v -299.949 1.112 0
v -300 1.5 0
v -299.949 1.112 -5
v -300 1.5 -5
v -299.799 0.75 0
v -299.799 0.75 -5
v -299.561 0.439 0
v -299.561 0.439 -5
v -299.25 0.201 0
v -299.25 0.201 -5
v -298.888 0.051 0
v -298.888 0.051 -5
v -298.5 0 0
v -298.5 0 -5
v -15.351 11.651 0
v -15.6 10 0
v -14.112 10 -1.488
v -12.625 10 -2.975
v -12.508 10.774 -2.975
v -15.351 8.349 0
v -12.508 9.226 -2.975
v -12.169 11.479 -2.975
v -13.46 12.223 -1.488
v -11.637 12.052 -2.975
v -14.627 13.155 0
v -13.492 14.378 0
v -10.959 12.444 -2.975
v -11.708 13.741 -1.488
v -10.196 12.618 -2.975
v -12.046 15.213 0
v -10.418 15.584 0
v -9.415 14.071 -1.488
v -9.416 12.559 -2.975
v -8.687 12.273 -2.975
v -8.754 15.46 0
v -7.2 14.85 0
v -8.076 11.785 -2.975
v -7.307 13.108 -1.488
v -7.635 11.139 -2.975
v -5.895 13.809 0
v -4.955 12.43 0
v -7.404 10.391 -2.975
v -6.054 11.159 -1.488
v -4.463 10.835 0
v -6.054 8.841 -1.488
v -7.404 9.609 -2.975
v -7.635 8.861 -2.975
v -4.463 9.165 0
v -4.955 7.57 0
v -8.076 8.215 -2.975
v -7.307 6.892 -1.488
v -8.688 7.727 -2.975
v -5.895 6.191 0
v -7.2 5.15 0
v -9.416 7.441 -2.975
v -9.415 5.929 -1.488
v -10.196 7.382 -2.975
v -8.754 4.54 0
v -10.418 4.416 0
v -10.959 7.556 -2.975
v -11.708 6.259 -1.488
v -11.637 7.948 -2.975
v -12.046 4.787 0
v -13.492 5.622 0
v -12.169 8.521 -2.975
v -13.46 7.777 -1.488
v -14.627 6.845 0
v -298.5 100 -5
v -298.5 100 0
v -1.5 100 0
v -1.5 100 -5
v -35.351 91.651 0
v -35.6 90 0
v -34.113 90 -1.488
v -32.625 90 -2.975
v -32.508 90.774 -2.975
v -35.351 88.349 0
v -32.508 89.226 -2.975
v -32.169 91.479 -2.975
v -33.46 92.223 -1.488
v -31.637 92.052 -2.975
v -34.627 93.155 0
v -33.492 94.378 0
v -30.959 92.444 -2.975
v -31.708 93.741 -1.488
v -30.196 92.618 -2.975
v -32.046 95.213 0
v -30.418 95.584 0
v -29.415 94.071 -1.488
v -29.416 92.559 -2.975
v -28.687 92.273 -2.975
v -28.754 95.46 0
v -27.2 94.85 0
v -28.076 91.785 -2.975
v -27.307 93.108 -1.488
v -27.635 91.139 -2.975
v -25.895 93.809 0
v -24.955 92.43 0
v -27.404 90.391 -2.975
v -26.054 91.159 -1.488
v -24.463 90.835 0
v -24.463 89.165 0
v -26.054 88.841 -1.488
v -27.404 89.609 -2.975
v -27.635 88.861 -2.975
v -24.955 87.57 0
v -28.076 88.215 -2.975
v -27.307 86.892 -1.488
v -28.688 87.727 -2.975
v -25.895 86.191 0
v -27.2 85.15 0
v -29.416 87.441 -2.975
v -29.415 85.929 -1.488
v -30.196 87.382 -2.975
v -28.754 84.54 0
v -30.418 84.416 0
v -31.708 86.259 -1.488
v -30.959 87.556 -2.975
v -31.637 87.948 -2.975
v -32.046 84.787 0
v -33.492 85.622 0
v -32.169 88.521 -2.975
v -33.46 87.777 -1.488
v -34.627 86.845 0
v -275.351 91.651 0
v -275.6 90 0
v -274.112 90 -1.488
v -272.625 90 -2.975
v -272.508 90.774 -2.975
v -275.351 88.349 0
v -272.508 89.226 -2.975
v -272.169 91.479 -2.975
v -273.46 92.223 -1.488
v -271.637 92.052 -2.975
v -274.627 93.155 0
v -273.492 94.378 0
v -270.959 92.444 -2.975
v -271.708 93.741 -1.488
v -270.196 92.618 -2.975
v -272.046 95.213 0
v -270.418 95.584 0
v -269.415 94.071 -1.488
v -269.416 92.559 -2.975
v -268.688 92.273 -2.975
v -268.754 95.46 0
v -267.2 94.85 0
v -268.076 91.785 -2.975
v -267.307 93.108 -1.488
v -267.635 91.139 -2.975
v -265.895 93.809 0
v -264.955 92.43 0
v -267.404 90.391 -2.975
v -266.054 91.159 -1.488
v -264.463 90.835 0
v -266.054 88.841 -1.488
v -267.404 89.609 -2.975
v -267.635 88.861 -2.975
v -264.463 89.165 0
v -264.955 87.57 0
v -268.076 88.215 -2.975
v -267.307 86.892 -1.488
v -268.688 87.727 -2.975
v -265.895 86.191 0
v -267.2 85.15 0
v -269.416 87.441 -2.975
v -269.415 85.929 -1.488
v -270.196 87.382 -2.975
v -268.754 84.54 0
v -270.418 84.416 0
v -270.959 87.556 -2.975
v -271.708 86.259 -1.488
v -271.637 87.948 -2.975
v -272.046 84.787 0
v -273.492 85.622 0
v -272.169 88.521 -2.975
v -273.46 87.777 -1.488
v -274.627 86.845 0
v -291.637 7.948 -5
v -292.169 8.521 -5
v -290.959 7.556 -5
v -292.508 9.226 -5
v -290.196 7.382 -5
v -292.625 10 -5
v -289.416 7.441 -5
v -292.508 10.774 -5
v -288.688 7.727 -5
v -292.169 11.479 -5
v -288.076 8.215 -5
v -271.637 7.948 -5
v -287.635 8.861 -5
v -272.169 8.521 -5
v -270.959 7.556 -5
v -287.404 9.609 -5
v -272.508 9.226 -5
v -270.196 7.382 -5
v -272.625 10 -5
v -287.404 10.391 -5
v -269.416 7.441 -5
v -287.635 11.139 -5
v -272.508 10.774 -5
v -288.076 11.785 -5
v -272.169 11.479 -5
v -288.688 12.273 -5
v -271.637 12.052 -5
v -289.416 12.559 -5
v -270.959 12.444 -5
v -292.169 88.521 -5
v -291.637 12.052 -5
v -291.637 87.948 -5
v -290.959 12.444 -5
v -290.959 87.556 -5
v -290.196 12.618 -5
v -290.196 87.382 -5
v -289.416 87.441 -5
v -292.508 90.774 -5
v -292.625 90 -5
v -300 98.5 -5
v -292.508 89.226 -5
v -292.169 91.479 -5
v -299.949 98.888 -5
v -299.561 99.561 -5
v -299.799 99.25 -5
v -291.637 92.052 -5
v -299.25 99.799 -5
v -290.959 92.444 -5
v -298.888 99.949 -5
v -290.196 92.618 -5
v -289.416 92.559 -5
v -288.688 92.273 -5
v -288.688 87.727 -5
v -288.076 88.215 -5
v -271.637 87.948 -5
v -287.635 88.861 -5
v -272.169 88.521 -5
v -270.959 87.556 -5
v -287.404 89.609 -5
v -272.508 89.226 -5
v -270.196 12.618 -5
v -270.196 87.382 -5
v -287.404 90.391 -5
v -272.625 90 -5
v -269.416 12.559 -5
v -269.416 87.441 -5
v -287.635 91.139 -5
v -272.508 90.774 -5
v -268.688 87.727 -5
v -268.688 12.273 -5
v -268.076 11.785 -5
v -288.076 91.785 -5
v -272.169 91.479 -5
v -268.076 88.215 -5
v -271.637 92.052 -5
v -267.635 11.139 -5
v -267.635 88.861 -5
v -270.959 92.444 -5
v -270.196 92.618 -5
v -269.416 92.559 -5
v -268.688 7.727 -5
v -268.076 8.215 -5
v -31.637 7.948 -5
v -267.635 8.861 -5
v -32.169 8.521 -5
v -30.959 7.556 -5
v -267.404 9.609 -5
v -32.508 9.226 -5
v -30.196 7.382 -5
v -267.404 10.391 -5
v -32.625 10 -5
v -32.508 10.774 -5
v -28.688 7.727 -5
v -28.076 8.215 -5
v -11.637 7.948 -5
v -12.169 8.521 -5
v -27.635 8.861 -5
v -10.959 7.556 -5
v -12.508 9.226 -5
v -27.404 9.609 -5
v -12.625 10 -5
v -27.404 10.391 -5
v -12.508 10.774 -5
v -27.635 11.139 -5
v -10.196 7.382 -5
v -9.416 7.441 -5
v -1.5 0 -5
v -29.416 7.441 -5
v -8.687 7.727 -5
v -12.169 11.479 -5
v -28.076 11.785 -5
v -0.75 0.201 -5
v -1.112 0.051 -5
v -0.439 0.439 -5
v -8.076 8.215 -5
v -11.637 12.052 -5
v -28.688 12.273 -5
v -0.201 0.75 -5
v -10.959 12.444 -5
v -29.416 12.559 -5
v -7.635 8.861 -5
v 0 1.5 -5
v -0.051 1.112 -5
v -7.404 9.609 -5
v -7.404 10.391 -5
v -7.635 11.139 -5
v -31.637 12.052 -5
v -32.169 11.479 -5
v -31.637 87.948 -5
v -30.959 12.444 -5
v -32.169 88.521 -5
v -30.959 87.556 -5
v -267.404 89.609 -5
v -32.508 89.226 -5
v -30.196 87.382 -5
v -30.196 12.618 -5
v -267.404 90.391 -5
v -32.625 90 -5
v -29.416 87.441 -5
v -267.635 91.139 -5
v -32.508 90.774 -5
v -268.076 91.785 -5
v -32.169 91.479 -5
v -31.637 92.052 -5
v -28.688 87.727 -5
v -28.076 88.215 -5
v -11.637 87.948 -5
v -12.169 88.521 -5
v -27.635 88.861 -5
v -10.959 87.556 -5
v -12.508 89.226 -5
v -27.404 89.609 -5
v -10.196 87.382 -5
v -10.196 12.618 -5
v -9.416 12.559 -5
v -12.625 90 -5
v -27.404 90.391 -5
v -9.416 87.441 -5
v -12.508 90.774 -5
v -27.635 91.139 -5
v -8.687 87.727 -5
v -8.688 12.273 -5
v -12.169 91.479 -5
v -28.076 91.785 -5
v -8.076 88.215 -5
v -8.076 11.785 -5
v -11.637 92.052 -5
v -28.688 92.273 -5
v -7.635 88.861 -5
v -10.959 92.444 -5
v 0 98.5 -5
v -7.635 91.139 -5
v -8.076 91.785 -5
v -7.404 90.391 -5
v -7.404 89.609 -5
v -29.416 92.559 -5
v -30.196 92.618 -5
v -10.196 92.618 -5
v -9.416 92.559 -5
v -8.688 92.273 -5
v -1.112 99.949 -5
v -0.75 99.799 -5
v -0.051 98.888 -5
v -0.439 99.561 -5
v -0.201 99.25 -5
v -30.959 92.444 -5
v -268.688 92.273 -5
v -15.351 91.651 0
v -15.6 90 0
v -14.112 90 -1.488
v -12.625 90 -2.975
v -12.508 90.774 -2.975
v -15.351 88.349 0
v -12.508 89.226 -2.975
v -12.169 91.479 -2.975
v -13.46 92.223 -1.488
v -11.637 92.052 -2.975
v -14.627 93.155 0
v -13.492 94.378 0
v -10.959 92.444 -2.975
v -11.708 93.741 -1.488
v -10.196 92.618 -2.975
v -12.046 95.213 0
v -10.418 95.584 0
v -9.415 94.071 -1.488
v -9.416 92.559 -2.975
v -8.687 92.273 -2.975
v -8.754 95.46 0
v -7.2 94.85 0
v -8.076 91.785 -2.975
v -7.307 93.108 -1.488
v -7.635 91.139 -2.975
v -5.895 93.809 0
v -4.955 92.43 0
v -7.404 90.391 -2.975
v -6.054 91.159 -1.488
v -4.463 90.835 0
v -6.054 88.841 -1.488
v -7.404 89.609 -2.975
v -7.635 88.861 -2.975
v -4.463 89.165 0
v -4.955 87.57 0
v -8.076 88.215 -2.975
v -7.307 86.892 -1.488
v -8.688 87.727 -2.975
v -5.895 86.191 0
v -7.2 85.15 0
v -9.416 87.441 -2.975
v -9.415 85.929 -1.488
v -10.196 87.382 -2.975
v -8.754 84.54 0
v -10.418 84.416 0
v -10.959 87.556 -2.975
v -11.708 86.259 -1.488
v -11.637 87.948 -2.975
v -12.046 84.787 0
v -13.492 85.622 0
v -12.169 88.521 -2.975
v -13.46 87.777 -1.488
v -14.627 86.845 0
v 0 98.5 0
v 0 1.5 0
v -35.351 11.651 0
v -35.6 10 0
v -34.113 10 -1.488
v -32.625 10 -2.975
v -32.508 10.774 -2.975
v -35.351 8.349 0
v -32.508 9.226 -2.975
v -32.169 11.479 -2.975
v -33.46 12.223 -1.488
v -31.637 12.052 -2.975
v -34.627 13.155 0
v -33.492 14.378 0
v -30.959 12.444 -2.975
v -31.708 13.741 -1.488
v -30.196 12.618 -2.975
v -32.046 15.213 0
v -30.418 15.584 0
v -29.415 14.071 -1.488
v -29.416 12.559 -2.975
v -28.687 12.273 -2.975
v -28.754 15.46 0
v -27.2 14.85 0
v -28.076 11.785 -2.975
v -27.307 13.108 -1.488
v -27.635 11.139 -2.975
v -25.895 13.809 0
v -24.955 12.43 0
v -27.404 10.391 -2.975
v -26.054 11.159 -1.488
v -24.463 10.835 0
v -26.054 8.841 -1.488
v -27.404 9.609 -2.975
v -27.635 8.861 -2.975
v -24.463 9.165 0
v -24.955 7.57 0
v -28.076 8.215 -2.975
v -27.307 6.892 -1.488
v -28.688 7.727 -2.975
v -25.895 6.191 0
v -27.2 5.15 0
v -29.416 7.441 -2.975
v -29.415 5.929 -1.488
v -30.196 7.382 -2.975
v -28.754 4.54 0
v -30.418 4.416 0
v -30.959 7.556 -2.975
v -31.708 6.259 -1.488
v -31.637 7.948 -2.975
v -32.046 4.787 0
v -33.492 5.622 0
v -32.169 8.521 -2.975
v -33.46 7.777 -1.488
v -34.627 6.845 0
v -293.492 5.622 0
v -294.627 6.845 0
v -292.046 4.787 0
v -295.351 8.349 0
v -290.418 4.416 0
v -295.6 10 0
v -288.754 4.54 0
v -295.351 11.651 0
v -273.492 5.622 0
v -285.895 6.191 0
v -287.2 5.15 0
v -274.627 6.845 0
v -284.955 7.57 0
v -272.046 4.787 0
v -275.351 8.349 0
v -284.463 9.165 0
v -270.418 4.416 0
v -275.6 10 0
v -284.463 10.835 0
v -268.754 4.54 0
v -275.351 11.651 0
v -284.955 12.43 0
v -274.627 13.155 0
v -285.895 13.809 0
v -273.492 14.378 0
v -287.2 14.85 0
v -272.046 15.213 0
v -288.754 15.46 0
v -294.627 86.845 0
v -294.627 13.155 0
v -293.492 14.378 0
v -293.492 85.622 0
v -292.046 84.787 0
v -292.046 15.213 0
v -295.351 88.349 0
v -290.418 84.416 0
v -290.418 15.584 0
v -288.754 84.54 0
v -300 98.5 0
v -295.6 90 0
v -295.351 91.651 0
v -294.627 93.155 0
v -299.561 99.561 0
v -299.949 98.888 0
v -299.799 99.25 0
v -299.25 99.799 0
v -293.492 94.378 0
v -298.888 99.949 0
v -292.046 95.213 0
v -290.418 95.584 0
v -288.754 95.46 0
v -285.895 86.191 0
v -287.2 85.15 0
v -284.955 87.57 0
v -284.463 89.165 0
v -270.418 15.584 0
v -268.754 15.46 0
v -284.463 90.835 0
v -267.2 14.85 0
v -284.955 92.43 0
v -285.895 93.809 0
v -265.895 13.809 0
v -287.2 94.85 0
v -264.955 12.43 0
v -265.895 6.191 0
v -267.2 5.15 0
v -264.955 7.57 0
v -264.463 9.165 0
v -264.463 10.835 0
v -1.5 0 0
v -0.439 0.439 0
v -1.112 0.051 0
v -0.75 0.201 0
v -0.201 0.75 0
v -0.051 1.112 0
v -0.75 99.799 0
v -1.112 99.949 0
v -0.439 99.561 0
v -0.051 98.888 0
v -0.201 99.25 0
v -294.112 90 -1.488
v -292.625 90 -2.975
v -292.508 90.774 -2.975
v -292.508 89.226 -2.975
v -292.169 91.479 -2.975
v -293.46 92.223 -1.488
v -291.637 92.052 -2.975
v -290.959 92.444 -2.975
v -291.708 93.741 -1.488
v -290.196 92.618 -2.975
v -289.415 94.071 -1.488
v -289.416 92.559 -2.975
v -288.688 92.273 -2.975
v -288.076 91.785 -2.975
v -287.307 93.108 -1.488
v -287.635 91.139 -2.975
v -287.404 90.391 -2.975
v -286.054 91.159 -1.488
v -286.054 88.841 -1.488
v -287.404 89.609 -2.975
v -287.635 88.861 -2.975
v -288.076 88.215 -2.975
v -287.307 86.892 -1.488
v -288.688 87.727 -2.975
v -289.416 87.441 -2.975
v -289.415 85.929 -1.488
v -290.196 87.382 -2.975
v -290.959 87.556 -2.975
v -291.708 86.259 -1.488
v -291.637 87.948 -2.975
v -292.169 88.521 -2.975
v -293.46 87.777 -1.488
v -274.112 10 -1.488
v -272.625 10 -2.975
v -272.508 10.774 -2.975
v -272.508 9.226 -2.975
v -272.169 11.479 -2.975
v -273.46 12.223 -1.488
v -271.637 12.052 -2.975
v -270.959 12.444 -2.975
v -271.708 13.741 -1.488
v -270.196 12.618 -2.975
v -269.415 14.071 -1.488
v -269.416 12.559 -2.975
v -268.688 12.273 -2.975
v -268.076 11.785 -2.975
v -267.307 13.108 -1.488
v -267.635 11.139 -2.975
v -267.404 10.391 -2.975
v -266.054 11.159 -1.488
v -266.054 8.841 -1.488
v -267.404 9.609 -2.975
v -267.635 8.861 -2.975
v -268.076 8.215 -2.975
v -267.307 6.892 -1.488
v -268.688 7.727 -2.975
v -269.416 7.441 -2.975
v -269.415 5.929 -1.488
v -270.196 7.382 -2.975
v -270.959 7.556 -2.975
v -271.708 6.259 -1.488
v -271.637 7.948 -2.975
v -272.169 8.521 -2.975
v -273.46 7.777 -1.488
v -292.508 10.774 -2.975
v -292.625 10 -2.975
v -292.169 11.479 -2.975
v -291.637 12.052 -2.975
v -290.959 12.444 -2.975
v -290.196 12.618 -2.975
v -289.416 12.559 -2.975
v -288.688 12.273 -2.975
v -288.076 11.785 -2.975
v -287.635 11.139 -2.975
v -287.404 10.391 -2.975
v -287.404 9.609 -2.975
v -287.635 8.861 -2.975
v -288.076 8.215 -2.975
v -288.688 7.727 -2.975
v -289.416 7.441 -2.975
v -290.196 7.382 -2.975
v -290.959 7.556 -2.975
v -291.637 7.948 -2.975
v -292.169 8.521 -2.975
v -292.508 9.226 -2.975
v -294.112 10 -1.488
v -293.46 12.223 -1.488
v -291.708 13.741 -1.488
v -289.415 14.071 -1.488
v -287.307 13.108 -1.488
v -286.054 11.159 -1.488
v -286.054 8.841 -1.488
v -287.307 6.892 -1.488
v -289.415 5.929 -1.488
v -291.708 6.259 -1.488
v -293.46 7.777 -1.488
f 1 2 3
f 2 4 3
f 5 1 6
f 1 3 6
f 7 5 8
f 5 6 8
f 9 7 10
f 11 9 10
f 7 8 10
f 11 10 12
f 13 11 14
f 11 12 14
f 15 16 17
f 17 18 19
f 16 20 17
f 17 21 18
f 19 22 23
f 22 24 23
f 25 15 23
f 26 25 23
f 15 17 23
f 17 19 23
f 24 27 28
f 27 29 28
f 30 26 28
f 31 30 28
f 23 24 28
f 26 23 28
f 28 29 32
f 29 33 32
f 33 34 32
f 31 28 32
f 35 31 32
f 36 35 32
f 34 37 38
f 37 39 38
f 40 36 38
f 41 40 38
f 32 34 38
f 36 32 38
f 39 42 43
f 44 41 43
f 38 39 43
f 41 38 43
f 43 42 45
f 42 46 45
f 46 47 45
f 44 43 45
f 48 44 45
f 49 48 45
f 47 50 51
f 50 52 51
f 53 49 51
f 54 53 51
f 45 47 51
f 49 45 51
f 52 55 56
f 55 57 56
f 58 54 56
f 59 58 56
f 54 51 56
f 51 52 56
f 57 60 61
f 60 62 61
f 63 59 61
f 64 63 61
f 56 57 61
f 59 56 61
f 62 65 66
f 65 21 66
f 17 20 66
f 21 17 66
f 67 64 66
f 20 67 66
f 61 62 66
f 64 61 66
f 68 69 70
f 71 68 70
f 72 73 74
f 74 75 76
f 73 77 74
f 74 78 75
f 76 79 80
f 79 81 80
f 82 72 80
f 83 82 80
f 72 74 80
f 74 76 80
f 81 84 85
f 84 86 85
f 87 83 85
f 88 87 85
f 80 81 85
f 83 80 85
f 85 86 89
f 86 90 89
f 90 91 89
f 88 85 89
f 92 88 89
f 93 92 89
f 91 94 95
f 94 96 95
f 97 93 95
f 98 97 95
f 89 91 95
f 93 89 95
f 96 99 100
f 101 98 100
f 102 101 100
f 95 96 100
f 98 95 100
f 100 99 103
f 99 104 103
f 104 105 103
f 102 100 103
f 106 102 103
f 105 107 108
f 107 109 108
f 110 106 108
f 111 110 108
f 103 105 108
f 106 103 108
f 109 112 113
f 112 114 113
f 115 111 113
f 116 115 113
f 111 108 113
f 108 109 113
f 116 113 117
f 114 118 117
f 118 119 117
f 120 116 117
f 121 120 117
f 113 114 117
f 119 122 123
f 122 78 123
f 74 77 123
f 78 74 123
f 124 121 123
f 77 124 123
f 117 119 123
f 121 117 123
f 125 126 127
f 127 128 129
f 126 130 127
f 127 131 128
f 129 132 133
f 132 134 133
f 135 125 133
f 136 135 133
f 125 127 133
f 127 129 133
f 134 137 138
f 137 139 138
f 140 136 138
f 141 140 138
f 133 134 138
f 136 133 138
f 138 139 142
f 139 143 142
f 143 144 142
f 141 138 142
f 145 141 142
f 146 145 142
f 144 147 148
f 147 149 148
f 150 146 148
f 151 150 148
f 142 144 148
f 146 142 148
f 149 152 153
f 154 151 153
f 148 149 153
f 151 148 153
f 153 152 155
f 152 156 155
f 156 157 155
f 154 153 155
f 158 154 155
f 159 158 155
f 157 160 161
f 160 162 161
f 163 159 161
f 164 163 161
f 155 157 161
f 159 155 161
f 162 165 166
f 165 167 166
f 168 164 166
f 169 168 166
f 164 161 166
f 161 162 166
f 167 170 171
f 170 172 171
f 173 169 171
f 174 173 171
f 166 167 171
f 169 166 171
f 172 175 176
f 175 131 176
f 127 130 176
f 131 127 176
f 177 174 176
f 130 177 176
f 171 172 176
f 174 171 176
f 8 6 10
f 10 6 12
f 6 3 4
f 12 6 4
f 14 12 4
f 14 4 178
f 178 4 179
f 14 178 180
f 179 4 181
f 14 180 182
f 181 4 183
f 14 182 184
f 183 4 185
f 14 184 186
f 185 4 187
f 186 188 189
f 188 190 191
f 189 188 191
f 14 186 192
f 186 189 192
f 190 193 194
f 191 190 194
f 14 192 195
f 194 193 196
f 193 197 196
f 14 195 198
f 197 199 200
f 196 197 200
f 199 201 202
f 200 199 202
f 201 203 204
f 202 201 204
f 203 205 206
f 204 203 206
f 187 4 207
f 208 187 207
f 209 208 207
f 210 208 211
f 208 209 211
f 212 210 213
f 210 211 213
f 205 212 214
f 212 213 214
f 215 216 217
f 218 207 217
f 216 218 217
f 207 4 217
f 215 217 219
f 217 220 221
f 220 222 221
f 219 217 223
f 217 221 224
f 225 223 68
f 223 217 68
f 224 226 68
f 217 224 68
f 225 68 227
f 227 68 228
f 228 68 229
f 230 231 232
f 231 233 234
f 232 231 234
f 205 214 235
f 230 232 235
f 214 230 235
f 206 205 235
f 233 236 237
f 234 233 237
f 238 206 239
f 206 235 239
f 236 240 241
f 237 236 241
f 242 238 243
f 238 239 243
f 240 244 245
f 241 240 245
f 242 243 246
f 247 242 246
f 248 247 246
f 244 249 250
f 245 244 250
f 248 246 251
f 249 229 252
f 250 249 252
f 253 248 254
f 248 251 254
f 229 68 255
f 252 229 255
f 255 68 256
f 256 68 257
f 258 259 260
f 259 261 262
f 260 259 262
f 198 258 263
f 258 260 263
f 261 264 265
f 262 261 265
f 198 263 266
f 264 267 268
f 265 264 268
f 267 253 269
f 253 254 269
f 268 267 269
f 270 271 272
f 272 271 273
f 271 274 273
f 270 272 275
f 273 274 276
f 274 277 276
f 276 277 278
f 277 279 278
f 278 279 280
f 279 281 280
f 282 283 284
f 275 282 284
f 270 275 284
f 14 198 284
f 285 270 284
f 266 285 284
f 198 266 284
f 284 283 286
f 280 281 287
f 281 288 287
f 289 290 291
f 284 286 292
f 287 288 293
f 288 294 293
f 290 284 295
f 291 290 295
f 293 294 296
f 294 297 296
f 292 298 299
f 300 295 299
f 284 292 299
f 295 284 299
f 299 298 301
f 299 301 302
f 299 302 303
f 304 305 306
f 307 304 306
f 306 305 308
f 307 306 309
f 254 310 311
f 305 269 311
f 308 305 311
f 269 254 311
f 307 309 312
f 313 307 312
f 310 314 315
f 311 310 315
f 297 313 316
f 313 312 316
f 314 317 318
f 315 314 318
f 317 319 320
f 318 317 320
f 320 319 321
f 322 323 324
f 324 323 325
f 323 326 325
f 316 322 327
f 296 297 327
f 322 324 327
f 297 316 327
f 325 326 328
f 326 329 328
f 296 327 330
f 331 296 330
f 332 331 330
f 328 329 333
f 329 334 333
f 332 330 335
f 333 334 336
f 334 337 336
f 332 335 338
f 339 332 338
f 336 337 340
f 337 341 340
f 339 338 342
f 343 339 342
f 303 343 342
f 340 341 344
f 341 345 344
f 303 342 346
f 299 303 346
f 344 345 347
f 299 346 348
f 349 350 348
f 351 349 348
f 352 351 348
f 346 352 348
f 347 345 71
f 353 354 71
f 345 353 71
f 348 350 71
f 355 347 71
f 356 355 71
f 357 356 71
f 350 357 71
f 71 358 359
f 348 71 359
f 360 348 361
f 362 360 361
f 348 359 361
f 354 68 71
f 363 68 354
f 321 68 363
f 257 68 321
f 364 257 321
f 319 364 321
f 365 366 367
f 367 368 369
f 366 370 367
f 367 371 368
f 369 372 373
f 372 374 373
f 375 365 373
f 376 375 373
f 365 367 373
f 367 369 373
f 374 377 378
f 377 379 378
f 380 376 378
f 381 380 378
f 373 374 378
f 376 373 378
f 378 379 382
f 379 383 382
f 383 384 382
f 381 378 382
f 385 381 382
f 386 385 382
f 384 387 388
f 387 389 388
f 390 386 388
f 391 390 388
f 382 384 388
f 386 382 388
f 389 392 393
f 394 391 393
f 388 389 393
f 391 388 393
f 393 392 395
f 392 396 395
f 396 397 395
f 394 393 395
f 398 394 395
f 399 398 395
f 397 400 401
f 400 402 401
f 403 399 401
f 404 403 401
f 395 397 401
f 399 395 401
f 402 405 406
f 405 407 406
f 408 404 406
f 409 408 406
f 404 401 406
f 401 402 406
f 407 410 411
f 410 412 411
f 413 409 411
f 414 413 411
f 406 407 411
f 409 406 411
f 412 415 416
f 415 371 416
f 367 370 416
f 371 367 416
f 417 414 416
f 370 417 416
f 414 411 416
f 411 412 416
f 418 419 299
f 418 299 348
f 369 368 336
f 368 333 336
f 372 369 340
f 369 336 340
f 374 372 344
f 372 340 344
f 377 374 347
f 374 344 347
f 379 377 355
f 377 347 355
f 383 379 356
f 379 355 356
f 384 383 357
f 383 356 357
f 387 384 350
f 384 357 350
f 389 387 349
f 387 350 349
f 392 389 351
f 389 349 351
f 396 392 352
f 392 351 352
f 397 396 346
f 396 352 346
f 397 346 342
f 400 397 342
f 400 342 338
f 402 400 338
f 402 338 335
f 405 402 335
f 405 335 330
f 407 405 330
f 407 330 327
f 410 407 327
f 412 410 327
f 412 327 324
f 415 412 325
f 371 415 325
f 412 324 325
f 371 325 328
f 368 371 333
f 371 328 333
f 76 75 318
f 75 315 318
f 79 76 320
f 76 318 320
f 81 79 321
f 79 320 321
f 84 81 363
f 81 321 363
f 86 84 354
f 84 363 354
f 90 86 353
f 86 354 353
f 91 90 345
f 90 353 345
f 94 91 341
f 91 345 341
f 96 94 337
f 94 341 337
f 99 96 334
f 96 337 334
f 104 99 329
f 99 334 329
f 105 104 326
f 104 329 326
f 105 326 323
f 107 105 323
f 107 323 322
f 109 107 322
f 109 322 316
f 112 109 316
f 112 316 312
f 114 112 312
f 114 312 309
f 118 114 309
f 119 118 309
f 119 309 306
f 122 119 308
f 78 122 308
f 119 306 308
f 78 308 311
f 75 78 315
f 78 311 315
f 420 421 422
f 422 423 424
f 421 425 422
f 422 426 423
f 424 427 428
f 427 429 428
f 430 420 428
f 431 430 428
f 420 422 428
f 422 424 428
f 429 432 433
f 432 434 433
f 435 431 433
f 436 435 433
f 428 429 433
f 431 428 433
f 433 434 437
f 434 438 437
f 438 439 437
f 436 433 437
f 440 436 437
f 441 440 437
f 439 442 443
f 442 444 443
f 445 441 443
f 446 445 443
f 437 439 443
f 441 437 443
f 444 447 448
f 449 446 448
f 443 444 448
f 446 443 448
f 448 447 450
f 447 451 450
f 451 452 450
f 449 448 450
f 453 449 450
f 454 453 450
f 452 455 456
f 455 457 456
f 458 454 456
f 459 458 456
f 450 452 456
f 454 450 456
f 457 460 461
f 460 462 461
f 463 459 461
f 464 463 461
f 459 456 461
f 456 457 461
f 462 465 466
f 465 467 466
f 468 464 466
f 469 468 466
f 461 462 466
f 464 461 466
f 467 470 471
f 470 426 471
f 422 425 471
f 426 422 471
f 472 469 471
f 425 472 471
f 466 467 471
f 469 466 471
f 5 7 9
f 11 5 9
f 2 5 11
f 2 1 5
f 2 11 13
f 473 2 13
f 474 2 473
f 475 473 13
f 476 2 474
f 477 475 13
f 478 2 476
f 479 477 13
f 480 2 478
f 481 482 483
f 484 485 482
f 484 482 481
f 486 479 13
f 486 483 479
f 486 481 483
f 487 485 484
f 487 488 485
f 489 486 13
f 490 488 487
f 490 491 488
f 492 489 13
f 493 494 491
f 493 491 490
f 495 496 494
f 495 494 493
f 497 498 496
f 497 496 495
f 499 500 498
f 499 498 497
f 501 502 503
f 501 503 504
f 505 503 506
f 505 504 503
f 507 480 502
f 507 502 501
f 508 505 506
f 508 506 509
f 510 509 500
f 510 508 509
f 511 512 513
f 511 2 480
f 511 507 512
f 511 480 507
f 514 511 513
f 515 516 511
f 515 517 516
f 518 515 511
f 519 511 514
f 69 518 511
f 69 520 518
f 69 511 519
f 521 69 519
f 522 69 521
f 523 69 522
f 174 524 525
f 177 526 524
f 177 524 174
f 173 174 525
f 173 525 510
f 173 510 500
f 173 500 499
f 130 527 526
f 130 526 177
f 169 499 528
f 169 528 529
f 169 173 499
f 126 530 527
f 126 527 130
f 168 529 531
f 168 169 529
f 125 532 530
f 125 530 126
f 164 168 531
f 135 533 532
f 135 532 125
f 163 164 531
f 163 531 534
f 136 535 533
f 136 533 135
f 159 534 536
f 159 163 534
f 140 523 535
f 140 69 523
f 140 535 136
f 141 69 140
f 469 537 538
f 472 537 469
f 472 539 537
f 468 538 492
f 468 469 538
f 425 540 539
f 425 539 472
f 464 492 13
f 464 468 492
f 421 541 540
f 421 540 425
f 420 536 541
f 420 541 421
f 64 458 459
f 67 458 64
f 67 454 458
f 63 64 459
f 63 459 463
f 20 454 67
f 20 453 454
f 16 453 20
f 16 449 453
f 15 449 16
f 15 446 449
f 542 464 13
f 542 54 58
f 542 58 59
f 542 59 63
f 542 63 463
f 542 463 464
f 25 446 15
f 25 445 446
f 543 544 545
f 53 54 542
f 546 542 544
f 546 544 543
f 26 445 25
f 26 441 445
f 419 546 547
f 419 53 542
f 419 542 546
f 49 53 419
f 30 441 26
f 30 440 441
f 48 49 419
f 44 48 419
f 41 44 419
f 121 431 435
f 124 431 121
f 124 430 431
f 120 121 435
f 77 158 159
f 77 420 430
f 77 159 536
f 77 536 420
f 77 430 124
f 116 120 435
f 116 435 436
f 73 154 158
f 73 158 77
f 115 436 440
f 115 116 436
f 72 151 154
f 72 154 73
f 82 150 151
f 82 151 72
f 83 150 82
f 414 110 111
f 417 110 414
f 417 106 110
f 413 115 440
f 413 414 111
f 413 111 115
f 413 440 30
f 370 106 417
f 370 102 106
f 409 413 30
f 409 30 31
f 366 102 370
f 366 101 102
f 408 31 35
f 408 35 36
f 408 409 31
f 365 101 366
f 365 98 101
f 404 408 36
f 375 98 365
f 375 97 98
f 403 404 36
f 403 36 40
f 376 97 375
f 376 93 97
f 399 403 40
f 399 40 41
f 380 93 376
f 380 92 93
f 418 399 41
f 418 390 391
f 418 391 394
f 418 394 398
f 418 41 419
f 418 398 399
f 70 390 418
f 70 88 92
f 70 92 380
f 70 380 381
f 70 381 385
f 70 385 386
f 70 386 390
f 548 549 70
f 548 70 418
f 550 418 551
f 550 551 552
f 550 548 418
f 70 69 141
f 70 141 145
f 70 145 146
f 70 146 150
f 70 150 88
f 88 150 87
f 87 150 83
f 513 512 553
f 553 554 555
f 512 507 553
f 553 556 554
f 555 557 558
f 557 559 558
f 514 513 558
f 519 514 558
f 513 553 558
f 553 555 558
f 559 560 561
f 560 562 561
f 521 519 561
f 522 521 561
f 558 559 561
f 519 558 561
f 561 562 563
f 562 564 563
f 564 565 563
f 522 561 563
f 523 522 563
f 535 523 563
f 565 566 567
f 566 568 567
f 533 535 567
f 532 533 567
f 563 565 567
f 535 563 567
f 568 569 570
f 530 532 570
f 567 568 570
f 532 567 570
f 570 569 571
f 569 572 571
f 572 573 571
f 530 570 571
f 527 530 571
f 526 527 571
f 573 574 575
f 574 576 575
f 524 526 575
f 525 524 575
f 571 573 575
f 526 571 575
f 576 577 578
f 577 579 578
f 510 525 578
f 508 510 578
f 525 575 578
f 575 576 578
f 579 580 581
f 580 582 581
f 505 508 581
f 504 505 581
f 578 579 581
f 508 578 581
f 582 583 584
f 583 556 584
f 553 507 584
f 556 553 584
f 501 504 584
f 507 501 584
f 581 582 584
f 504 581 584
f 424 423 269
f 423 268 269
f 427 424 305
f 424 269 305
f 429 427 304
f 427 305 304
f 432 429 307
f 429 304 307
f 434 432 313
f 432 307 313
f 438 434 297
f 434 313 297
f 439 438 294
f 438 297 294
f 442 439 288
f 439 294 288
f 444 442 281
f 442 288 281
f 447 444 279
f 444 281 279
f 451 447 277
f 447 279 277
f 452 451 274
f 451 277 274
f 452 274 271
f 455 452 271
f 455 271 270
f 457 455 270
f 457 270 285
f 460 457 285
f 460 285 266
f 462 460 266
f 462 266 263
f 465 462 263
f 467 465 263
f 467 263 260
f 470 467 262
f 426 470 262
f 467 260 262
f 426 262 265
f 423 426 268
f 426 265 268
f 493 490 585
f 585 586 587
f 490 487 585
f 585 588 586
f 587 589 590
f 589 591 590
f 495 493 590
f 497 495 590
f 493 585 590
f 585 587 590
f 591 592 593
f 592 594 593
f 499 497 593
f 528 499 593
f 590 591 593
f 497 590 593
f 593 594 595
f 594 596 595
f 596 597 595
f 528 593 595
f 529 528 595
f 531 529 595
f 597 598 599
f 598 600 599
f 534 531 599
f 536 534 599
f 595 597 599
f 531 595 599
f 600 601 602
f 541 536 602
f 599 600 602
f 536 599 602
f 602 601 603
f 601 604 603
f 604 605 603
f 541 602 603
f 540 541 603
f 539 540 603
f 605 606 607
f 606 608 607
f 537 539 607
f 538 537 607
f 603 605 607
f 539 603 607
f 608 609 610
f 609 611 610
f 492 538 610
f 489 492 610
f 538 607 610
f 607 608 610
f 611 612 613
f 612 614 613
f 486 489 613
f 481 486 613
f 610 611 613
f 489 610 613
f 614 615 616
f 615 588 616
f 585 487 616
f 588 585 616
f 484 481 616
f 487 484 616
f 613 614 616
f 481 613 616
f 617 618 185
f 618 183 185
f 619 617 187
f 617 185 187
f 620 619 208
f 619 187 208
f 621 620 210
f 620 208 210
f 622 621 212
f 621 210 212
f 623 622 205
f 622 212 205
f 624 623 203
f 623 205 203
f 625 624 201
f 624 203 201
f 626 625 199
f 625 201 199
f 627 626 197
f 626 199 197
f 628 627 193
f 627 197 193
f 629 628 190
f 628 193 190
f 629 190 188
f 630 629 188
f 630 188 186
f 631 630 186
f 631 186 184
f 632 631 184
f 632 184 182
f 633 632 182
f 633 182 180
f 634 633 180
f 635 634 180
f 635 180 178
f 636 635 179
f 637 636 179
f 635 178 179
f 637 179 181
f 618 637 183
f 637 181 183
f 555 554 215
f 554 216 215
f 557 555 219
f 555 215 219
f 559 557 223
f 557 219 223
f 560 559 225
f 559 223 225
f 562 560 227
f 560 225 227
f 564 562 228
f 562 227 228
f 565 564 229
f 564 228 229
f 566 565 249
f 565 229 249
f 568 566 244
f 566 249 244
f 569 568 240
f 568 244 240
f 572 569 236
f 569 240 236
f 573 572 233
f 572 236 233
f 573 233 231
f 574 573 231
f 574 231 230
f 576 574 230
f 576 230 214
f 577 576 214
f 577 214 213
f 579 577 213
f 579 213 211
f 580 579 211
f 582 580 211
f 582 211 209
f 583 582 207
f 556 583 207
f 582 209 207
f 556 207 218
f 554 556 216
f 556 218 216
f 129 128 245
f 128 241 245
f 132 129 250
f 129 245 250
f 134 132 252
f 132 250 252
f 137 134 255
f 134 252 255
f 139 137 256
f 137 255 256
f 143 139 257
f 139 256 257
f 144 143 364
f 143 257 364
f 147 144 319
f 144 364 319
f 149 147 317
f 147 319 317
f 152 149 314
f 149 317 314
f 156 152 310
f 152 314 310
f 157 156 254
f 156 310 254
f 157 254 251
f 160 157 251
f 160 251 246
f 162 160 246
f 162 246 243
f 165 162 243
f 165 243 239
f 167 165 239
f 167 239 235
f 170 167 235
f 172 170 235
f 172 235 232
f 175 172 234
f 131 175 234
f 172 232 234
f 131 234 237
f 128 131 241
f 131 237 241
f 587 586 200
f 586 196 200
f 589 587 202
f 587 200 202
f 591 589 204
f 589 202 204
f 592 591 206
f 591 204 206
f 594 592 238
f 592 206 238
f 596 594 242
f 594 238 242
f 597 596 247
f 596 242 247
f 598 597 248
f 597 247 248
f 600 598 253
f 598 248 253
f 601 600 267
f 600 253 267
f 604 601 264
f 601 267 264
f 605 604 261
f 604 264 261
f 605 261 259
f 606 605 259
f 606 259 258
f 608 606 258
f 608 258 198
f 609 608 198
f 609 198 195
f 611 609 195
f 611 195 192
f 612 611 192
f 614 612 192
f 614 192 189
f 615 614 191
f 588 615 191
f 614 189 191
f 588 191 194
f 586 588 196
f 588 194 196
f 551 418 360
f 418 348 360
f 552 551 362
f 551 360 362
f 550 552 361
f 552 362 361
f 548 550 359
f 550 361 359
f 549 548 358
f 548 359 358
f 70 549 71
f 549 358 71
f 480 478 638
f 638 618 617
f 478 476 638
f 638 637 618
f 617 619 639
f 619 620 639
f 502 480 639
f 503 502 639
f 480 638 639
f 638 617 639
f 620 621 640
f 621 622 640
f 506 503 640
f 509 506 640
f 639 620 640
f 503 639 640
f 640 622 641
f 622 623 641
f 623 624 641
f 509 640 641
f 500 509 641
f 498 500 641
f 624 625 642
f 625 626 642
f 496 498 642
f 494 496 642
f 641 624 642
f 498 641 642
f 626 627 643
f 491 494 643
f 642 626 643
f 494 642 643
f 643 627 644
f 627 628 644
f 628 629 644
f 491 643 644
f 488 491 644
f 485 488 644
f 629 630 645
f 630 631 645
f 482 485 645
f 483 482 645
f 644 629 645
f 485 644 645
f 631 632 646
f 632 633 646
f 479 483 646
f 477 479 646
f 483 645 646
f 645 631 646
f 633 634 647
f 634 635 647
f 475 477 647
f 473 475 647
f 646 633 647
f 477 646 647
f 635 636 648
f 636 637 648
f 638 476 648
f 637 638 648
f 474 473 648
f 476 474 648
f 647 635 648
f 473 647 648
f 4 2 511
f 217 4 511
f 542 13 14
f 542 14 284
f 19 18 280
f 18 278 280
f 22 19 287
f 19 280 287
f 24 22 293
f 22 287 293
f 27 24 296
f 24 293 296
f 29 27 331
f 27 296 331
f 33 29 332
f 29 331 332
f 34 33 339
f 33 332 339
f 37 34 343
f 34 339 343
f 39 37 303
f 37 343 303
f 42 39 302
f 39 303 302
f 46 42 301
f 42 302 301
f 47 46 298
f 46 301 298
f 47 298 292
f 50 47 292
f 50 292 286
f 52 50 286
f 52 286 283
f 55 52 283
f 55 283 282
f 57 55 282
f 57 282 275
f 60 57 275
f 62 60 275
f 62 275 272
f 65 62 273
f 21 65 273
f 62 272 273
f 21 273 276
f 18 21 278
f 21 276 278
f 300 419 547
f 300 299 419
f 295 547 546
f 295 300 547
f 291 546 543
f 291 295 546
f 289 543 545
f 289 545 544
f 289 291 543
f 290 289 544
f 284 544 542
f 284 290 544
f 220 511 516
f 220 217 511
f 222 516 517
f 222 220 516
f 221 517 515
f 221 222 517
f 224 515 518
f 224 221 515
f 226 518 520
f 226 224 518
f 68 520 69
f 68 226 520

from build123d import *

# Parameters (mm, degrees)
F0_W           = 300
F0_H           = 100
F1_DEPTH       = 5
F2_D           = 5.25
F2_CSINK_D     = 11.2
F2_CSINK_ANGLE = 90
F3_R           = 1.5


with BuildPart() as f1:
    # F0 (on Top) → F1 (new body)
    with BuildSketch(Plane.XY):
        with Locations((-150, 50)):
            Rectangle(F0_W, F0_H)
    extrude(amount=-F1_DEPTH)

    # F2 (through all)
    with Locations(Plane.XY):
        with Locations((-290, 10), (-270, 10), (-30, 10), (-10, 10), (-30, 90), (-10, 90), (-290, 90), (-270, 90)):
            CounterSinkHole(F2_D / 2, F2_CSINK_D / 2, counter_sink_angle=F2_CSINK_ANGLE)

    # F3
    f3_edges = [f1.edges().sort_by_distance(p)[0] for p in [
        (0, 0, -2.5),
        (0, 100, -2.5),
        (-300, 0, -2.5),
        (-300, 100, -2.5),
    ]]
    fillet(f3_edges, radius=F3_R)


solid = f1.part
